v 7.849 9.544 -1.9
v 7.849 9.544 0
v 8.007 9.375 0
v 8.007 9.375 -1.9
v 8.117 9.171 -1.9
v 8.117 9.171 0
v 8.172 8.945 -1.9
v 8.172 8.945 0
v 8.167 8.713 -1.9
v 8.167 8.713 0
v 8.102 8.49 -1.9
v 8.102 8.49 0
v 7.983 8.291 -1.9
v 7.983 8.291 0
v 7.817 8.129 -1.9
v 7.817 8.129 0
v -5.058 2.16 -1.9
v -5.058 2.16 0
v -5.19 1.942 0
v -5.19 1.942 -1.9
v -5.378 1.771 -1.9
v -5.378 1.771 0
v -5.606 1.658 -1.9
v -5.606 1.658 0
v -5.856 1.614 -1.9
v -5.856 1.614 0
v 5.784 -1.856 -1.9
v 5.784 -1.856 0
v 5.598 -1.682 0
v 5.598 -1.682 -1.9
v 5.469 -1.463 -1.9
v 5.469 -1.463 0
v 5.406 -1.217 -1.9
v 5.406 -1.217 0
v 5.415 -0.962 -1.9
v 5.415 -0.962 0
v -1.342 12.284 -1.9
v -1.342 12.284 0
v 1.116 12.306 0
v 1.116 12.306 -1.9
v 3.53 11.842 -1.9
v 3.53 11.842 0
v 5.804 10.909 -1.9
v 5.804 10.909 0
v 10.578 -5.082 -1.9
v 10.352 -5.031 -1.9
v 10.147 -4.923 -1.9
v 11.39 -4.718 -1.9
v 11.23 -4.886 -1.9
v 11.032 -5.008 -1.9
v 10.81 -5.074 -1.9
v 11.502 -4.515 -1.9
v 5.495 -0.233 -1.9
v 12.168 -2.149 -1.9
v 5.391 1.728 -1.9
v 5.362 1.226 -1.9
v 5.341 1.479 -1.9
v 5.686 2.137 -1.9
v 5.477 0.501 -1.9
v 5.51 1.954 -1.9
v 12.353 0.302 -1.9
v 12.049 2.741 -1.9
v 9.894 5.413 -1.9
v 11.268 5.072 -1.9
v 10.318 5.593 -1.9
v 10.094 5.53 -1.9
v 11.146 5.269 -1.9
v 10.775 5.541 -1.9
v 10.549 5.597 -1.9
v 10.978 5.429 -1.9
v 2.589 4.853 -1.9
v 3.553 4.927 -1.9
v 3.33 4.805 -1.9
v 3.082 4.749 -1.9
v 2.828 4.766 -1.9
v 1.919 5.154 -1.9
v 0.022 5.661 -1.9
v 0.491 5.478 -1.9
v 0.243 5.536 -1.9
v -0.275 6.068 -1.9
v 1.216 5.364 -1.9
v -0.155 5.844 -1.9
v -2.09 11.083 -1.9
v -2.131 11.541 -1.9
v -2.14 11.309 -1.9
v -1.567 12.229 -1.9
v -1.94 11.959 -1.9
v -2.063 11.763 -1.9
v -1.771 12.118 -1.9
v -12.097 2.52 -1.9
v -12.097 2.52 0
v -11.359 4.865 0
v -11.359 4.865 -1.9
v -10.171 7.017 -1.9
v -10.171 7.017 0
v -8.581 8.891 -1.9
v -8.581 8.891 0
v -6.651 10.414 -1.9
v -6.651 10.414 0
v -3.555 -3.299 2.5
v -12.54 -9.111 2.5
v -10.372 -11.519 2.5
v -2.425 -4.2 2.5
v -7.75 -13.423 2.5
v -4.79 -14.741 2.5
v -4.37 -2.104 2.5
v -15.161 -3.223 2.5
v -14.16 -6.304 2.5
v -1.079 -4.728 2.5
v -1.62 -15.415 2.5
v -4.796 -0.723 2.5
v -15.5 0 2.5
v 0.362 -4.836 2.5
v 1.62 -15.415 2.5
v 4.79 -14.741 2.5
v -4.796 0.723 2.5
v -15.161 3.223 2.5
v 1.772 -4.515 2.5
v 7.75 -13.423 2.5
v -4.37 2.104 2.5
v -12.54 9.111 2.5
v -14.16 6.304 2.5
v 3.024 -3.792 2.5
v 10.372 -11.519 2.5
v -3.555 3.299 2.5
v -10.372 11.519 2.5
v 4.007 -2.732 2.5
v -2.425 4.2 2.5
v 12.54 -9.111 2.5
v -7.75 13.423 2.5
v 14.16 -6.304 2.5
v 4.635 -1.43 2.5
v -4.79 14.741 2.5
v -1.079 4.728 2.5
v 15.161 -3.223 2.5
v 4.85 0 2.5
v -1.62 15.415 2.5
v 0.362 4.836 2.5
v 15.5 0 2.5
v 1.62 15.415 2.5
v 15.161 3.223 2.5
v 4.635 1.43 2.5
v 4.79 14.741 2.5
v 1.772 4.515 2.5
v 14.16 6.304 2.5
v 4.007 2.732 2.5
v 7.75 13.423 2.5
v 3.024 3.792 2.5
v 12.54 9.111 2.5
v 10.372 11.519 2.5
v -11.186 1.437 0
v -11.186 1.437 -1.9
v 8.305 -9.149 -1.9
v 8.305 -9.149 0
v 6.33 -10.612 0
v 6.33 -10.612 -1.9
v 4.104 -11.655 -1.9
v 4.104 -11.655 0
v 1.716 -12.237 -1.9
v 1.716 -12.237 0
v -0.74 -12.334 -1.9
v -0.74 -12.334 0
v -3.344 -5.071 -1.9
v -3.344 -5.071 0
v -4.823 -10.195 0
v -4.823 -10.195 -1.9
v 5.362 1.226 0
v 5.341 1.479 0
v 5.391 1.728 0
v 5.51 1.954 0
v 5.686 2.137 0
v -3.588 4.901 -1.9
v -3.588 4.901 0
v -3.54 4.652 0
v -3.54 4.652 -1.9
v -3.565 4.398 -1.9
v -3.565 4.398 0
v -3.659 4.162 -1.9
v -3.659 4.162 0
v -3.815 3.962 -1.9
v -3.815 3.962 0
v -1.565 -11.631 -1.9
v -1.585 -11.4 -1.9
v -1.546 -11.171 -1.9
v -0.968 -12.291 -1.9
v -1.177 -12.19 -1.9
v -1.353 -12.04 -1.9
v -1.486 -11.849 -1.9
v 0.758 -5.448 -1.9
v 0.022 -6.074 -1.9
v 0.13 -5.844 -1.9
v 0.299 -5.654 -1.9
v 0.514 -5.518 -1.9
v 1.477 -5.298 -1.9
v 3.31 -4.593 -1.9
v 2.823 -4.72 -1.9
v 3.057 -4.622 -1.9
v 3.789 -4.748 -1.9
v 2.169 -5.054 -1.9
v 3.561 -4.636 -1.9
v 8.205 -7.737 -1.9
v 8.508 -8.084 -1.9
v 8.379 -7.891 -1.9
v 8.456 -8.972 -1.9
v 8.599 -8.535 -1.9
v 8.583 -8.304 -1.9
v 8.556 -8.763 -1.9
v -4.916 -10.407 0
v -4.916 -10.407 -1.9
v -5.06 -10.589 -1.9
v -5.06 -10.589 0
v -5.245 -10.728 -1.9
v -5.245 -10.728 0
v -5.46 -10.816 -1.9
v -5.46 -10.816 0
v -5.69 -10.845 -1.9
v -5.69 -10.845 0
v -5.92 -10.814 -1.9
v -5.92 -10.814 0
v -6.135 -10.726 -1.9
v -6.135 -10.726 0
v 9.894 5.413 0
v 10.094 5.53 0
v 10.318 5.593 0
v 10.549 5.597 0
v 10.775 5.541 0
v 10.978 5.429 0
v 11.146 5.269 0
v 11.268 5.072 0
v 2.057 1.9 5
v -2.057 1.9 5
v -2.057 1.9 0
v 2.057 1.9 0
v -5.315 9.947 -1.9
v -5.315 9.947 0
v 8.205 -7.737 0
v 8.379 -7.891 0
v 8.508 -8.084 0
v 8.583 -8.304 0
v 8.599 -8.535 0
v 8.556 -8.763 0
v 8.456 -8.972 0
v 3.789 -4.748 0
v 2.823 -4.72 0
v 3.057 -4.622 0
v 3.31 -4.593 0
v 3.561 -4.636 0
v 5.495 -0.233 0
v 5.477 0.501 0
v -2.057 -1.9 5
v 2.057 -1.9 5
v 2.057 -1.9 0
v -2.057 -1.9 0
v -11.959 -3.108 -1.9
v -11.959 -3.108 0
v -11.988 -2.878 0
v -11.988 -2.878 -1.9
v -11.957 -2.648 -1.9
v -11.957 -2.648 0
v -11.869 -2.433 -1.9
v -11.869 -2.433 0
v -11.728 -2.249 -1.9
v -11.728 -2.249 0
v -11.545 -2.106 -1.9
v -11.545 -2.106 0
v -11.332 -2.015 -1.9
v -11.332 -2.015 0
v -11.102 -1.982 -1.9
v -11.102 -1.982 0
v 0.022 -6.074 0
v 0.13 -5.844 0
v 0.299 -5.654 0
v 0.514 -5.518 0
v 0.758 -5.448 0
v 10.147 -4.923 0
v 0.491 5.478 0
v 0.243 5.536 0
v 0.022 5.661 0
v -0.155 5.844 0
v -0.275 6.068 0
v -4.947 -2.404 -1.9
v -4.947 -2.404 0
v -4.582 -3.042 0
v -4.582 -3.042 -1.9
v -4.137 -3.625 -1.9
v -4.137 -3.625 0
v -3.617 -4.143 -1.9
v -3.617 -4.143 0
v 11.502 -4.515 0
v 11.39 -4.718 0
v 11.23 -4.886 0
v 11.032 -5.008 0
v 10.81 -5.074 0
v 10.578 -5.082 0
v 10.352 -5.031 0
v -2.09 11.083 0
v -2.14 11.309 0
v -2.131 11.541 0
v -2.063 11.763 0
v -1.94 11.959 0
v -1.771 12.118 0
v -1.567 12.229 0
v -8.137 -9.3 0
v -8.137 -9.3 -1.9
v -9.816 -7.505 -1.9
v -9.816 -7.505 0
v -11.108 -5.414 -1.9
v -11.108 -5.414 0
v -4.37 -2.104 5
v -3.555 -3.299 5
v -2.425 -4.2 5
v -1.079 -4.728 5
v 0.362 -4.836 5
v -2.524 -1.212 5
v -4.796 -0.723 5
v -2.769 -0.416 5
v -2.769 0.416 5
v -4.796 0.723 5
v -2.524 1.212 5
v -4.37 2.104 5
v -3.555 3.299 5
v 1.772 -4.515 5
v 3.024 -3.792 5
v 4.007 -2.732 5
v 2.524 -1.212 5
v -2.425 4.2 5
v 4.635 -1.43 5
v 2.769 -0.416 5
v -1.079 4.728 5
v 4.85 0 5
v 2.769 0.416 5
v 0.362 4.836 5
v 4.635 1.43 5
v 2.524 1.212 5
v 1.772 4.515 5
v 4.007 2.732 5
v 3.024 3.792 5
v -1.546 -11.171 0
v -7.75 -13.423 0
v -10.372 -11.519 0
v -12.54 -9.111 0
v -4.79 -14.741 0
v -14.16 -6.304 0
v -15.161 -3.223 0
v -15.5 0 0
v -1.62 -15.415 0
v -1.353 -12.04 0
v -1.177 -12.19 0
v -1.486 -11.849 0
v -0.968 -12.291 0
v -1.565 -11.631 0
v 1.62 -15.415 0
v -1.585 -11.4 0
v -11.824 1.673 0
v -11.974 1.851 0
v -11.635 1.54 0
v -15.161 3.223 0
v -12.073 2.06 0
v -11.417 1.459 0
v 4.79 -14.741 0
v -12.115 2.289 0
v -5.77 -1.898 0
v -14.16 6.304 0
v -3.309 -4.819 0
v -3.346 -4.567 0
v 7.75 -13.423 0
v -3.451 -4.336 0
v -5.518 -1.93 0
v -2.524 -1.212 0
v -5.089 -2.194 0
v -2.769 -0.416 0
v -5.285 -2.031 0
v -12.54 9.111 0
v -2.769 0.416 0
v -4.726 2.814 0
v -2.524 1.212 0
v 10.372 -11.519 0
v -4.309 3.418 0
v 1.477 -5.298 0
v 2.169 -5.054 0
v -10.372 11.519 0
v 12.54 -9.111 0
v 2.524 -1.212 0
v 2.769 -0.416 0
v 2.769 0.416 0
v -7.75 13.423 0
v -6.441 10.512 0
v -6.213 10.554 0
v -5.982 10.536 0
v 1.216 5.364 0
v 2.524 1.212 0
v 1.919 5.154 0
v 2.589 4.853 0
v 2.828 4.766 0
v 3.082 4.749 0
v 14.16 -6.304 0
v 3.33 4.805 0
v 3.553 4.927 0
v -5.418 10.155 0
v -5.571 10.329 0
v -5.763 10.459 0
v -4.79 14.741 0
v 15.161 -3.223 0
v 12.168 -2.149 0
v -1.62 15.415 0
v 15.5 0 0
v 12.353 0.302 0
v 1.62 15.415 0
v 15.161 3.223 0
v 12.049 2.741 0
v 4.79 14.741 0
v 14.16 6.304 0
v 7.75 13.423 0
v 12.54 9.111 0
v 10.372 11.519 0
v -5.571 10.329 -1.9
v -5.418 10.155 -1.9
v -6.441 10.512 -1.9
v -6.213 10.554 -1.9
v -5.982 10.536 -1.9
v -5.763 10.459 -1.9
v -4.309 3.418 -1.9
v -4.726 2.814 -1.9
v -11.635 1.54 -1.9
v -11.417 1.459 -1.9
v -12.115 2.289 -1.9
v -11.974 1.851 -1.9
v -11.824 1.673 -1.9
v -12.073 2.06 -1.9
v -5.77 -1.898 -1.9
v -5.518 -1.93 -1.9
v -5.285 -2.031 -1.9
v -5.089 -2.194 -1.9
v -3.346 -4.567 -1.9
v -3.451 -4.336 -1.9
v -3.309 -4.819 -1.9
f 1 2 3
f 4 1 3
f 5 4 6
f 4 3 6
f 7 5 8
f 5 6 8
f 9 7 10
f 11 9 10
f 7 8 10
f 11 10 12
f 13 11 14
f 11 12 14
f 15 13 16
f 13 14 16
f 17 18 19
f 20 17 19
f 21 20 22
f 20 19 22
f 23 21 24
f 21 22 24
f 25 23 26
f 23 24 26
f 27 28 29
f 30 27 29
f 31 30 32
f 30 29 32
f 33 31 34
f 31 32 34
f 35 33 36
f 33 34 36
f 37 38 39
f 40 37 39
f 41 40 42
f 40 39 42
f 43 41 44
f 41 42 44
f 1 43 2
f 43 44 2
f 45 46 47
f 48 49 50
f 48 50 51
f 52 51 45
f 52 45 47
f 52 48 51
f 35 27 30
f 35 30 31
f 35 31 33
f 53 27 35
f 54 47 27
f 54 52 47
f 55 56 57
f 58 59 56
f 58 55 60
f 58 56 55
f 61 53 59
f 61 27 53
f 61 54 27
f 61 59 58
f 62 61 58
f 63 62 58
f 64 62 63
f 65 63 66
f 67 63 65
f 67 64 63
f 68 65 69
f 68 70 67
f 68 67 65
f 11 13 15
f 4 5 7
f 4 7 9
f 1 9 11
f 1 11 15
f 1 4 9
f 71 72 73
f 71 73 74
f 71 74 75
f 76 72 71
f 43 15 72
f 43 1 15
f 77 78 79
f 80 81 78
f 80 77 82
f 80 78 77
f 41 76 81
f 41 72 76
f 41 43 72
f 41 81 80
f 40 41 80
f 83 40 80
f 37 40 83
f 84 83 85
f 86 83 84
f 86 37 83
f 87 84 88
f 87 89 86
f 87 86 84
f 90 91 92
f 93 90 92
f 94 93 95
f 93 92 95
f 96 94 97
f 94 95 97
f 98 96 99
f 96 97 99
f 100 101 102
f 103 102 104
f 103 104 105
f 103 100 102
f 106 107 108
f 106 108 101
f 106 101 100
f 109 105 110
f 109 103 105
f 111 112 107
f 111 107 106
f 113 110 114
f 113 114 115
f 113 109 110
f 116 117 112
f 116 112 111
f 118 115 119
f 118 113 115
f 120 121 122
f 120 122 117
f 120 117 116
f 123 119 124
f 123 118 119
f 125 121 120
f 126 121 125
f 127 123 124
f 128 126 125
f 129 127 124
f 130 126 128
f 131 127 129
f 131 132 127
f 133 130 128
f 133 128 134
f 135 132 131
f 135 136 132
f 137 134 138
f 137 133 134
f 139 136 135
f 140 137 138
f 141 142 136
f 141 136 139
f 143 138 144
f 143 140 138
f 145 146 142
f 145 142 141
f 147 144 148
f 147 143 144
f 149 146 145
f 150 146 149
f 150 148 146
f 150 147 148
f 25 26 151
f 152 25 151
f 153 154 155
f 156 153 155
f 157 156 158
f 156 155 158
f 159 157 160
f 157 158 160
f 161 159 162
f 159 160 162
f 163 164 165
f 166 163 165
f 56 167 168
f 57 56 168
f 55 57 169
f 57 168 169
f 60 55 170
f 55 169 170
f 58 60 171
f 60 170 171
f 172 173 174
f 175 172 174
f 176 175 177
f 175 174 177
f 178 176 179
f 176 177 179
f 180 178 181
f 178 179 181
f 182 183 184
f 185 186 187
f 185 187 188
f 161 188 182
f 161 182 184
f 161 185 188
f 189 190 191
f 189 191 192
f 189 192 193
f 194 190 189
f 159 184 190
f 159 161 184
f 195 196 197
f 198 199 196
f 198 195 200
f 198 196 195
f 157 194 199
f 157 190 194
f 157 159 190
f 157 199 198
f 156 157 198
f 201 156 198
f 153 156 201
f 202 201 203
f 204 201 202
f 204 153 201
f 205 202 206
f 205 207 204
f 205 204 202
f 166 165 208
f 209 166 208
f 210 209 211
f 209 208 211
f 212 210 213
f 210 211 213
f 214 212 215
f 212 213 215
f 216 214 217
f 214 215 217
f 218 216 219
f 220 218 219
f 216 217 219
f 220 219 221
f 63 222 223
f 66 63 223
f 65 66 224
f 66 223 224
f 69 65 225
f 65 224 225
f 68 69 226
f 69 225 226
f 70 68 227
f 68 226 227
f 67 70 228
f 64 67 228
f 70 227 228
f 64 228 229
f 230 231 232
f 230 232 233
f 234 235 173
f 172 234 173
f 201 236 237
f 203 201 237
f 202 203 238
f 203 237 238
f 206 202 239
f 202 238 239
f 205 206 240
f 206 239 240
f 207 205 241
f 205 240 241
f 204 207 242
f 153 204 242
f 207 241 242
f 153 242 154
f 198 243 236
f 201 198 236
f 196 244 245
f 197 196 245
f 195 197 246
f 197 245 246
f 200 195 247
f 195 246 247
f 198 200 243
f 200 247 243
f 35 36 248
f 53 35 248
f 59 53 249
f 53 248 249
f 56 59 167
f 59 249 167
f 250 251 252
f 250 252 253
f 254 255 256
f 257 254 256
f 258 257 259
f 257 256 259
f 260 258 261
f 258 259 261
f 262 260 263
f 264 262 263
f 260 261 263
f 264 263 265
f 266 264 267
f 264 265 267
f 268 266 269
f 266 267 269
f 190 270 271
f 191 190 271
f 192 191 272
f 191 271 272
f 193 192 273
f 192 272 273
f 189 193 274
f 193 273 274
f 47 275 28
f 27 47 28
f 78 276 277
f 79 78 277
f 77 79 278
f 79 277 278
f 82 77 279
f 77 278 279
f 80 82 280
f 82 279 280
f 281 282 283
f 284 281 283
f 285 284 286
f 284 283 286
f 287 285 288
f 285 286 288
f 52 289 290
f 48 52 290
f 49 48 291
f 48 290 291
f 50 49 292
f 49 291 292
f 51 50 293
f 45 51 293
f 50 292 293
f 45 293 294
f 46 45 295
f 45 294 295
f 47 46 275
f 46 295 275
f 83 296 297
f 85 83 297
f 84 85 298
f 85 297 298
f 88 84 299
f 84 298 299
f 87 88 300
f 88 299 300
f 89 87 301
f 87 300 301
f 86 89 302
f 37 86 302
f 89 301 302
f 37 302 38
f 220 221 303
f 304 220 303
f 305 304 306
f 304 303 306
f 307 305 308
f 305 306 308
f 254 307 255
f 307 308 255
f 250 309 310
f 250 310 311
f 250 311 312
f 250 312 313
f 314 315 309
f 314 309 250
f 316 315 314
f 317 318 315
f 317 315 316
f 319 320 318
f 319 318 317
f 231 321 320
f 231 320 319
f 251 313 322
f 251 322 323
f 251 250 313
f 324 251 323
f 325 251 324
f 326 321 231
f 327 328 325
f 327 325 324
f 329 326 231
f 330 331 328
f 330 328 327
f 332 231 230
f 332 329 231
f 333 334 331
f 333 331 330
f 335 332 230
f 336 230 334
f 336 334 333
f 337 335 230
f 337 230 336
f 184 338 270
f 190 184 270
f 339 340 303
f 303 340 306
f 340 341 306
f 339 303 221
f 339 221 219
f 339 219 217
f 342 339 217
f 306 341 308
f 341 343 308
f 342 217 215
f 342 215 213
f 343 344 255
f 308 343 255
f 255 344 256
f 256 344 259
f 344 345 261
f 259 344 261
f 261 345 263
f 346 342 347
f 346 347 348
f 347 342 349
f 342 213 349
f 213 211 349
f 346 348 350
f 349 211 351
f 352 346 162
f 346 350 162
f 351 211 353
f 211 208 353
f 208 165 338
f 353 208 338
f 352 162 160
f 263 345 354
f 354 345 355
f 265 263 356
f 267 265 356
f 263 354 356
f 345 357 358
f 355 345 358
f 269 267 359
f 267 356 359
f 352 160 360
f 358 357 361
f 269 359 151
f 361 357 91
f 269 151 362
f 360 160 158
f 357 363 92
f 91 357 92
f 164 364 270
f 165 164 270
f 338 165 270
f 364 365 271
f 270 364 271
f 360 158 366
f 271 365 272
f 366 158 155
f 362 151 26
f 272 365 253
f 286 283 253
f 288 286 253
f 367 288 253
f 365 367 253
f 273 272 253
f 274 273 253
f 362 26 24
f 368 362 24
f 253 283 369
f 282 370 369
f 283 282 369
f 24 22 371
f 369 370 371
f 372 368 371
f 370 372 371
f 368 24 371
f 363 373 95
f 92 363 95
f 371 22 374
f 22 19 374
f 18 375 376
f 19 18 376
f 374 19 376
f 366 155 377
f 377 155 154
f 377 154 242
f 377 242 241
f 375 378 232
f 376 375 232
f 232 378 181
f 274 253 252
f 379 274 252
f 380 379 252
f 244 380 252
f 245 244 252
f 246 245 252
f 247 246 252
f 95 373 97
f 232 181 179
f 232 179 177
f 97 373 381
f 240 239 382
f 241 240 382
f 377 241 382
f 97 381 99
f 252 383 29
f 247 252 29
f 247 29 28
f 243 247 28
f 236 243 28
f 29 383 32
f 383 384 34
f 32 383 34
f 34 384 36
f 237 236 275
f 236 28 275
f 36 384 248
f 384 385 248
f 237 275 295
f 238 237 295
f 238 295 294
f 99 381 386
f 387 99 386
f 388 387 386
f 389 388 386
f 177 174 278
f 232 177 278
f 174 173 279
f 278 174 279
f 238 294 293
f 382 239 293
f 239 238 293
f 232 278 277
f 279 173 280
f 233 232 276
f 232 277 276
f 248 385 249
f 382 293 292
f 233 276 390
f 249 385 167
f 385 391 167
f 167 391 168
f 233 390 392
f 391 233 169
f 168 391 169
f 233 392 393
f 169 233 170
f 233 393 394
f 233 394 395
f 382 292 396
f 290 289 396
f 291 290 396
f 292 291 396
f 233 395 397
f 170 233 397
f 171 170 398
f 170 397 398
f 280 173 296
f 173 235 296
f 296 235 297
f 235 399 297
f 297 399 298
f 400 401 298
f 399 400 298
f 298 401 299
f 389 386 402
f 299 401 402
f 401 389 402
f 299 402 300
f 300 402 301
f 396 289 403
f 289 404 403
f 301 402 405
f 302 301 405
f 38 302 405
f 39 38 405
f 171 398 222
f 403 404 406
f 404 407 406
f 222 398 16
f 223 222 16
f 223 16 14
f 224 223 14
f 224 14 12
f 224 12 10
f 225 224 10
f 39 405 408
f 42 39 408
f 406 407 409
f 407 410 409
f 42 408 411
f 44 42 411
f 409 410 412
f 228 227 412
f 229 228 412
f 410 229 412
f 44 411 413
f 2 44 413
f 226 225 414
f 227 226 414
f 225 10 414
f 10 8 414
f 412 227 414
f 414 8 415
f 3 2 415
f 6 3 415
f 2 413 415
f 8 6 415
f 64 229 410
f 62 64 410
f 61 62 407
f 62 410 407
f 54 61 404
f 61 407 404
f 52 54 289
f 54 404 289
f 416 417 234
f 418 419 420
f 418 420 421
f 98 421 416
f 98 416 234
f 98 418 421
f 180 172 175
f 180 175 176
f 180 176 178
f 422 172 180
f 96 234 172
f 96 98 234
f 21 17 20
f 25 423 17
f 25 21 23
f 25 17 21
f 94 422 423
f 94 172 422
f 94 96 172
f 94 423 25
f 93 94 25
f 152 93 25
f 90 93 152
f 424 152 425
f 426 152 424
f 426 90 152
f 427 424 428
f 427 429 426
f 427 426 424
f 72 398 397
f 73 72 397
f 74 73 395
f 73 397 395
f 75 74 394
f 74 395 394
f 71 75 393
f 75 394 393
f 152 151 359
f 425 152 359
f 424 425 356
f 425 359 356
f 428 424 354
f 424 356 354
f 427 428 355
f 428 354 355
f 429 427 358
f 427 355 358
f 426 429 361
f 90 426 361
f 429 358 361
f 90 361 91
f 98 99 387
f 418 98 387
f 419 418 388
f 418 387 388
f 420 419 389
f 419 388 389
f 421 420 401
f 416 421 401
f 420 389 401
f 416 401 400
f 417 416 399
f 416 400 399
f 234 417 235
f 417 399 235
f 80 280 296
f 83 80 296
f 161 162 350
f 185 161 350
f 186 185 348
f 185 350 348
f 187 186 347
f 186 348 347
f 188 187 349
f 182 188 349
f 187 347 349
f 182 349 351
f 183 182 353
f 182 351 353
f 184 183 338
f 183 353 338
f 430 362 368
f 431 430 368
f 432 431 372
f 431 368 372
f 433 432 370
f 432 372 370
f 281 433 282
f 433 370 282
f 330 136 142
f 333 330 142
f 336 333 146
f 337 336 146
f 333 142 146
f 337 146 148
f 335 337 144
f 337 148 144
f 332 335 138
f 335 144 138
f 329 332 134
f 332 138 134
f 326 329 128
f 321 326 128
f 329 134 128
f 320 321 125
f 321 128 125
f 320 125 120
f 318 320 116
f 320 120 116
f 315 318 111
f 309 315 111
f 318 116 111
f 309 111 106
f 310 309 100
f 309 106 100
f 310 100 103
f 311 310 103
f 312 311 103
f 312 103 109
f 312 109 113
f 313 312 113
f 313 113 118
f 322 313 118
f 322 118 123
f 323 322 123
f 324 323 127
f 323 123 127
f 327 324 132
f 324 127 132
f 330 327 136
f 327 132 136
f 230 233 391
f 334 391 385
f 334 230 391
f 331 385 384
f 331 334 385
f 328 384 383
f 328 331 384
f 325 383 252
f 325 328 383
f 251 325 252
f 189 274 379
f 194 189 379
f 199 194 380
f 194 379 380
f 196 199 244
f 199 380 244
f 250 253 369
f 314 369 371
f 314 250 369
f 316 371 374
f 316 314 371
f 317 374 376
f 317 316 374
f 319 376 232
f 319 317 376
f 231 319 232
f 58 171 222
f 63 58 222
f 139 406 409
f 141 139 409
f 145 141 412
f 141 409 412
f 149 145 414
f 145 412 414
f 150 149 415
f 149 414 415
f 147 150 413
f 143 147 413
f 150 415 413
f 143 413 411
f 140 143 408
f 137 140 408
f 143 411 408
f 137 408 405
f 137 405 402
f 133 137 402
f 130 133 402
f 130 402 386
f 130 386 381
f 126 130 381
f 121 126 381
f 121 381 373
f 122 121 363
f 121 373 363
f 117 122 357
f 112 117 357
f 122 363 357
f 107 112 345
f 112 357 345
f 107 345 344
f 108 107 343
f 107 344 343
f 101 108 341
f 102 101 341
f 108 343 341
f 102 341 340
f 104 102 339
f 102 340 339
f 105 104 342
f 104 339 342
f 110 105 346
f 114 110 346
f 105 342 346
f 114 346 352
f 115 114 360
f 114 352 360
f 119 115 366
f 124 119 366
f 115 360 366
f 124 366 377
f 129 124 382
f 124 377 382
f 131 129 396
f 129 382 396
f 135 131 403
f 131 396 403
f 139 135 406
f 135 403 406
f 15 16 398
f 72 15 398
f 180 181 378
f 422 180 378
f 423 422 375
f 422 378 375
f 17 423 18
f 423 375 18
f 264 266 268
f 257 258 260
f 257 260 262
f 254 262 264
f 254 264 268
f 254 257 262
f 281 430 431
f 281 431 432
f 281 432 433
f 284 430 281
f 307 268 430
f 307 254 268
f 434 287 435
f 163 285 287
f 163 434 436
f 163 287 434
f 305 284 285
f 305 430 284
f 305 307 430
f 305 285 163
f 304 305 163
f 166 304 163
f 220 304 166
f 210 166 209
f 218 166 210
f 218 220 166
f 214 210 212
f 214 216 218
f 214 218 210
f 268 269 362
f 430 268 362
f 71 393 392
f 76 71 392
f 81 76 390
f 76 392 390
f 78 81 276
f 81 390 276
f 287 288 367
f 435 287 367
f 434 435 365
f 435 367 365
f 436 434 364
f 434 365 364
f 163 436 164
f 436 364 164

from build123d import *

# Parameters (mm, degrees)
SKETCH1_R           = 15.5
BOSS_EXTRUDE1_DEPTH = 2.5
BOSS_EXTRUDE2_DEPTH = 1.9
CIRPATTERN1_COUNT   = 5
BOSS_EXTRUDE3_START = 2.5
SKETCH3_R           = 4.85
BOSS_EXTRUDE3_DEPTH = 2.5
CUT_EXTRUDE2_DEPTH  = 7.9


with BuildPart() as part:
    # Sketch1 → Boss-Extrude1 (new body)
    with BuildSketch(Plane.XY):
        Circle(SKETCH1_R)
    extrude(amount=BOSS_EXTRUDE1_DEPTH)

    # Sketch2 → Boss-Extrude2 (add)
    with BuildSketch(Plane(origin=(0, 0, 0), x_dir=(-1, 0, 0), z_dir=(0, 0, -1))):
        with BuildLine():
            Line((-7.817353518, 8.129035943), (-3.552701535, 4.927044661))
            ThreePointArc((-3.552701535, 4.927044661), (-3.081541521, 4.749426556), (-2.588715364, 4.852685109))
            ThreePointArc((-2.588715364, 4.852685109), (-1.571286021, 5.27077416), (-0.491007267, 5.478039053))
            ThreePointArc((-0.491007267, 5.478039053), (-0.022087339, 5.66148946), (0.274905404, 6.068103848))
            Line((0.274905404, 6.068103848), (2.090121325, 11.082582471))
            ThreePointArc((2.090121325, 11.082582471), (2.007658151, 11.864965509), (1.341576089, 12.283603874))
            ThreePointArc((1.341576089, 12.283603874), (-3.530150602, 11.841654752), (-7.848632729, 9.543883635))
            ThreePointArc((-7.848632729, 9.543883635), (-8.176755455, 8.82885995), (-7.817353518, 8.129035943))
        make_face()
    boss_extrude2 = extrude(amount=BOSS_EXTRUDE2_DEPTH)

    # CirPattern1: Boss-Extrude2 ×5 about axis
    cirpattern1_axis = Axis((0, 0, 0), (0, 0, 1))
    for i in range(1, CIRPATTERN1_COUNT):
        add(boss_extrude2.rotate(cirpattern1_axis, i * 360 / CIRPATTERN1_COUNT))

    # Sketch3 → Boss-Extrude3 (add)
    with BuildSketch(Plane.XY.offset(BOSS_EXTRUDE3_START)):
        Circle(SKETCH3_R)
    extrude(amount=BOSS_EXTRUDE3_DEPTH)

    # Sketch5 → Cut-Extrude2 (cut, through all)
    with BuildSketch(Plane.XY.offset(5)):
        with BuildLine():
            Line((-2.05669638, 1.9), (2.05669638, 1.9))
            ThreePointArc((2.05669638, 1.9), (2.8, 0), (2.05669638, -1.9))
            Line((2.05669638, -1.9), (-2.05669638, -1.9))
            ThreePointArc((-2.05669638, -1.9), (-2.8, 0), (-2.05669638, 1.9))
        make_face()
    extrude(amount=-CUT_EXTRUDE2_DEPTH, mode=Mode.SUBTRACT)


solid = part.part
